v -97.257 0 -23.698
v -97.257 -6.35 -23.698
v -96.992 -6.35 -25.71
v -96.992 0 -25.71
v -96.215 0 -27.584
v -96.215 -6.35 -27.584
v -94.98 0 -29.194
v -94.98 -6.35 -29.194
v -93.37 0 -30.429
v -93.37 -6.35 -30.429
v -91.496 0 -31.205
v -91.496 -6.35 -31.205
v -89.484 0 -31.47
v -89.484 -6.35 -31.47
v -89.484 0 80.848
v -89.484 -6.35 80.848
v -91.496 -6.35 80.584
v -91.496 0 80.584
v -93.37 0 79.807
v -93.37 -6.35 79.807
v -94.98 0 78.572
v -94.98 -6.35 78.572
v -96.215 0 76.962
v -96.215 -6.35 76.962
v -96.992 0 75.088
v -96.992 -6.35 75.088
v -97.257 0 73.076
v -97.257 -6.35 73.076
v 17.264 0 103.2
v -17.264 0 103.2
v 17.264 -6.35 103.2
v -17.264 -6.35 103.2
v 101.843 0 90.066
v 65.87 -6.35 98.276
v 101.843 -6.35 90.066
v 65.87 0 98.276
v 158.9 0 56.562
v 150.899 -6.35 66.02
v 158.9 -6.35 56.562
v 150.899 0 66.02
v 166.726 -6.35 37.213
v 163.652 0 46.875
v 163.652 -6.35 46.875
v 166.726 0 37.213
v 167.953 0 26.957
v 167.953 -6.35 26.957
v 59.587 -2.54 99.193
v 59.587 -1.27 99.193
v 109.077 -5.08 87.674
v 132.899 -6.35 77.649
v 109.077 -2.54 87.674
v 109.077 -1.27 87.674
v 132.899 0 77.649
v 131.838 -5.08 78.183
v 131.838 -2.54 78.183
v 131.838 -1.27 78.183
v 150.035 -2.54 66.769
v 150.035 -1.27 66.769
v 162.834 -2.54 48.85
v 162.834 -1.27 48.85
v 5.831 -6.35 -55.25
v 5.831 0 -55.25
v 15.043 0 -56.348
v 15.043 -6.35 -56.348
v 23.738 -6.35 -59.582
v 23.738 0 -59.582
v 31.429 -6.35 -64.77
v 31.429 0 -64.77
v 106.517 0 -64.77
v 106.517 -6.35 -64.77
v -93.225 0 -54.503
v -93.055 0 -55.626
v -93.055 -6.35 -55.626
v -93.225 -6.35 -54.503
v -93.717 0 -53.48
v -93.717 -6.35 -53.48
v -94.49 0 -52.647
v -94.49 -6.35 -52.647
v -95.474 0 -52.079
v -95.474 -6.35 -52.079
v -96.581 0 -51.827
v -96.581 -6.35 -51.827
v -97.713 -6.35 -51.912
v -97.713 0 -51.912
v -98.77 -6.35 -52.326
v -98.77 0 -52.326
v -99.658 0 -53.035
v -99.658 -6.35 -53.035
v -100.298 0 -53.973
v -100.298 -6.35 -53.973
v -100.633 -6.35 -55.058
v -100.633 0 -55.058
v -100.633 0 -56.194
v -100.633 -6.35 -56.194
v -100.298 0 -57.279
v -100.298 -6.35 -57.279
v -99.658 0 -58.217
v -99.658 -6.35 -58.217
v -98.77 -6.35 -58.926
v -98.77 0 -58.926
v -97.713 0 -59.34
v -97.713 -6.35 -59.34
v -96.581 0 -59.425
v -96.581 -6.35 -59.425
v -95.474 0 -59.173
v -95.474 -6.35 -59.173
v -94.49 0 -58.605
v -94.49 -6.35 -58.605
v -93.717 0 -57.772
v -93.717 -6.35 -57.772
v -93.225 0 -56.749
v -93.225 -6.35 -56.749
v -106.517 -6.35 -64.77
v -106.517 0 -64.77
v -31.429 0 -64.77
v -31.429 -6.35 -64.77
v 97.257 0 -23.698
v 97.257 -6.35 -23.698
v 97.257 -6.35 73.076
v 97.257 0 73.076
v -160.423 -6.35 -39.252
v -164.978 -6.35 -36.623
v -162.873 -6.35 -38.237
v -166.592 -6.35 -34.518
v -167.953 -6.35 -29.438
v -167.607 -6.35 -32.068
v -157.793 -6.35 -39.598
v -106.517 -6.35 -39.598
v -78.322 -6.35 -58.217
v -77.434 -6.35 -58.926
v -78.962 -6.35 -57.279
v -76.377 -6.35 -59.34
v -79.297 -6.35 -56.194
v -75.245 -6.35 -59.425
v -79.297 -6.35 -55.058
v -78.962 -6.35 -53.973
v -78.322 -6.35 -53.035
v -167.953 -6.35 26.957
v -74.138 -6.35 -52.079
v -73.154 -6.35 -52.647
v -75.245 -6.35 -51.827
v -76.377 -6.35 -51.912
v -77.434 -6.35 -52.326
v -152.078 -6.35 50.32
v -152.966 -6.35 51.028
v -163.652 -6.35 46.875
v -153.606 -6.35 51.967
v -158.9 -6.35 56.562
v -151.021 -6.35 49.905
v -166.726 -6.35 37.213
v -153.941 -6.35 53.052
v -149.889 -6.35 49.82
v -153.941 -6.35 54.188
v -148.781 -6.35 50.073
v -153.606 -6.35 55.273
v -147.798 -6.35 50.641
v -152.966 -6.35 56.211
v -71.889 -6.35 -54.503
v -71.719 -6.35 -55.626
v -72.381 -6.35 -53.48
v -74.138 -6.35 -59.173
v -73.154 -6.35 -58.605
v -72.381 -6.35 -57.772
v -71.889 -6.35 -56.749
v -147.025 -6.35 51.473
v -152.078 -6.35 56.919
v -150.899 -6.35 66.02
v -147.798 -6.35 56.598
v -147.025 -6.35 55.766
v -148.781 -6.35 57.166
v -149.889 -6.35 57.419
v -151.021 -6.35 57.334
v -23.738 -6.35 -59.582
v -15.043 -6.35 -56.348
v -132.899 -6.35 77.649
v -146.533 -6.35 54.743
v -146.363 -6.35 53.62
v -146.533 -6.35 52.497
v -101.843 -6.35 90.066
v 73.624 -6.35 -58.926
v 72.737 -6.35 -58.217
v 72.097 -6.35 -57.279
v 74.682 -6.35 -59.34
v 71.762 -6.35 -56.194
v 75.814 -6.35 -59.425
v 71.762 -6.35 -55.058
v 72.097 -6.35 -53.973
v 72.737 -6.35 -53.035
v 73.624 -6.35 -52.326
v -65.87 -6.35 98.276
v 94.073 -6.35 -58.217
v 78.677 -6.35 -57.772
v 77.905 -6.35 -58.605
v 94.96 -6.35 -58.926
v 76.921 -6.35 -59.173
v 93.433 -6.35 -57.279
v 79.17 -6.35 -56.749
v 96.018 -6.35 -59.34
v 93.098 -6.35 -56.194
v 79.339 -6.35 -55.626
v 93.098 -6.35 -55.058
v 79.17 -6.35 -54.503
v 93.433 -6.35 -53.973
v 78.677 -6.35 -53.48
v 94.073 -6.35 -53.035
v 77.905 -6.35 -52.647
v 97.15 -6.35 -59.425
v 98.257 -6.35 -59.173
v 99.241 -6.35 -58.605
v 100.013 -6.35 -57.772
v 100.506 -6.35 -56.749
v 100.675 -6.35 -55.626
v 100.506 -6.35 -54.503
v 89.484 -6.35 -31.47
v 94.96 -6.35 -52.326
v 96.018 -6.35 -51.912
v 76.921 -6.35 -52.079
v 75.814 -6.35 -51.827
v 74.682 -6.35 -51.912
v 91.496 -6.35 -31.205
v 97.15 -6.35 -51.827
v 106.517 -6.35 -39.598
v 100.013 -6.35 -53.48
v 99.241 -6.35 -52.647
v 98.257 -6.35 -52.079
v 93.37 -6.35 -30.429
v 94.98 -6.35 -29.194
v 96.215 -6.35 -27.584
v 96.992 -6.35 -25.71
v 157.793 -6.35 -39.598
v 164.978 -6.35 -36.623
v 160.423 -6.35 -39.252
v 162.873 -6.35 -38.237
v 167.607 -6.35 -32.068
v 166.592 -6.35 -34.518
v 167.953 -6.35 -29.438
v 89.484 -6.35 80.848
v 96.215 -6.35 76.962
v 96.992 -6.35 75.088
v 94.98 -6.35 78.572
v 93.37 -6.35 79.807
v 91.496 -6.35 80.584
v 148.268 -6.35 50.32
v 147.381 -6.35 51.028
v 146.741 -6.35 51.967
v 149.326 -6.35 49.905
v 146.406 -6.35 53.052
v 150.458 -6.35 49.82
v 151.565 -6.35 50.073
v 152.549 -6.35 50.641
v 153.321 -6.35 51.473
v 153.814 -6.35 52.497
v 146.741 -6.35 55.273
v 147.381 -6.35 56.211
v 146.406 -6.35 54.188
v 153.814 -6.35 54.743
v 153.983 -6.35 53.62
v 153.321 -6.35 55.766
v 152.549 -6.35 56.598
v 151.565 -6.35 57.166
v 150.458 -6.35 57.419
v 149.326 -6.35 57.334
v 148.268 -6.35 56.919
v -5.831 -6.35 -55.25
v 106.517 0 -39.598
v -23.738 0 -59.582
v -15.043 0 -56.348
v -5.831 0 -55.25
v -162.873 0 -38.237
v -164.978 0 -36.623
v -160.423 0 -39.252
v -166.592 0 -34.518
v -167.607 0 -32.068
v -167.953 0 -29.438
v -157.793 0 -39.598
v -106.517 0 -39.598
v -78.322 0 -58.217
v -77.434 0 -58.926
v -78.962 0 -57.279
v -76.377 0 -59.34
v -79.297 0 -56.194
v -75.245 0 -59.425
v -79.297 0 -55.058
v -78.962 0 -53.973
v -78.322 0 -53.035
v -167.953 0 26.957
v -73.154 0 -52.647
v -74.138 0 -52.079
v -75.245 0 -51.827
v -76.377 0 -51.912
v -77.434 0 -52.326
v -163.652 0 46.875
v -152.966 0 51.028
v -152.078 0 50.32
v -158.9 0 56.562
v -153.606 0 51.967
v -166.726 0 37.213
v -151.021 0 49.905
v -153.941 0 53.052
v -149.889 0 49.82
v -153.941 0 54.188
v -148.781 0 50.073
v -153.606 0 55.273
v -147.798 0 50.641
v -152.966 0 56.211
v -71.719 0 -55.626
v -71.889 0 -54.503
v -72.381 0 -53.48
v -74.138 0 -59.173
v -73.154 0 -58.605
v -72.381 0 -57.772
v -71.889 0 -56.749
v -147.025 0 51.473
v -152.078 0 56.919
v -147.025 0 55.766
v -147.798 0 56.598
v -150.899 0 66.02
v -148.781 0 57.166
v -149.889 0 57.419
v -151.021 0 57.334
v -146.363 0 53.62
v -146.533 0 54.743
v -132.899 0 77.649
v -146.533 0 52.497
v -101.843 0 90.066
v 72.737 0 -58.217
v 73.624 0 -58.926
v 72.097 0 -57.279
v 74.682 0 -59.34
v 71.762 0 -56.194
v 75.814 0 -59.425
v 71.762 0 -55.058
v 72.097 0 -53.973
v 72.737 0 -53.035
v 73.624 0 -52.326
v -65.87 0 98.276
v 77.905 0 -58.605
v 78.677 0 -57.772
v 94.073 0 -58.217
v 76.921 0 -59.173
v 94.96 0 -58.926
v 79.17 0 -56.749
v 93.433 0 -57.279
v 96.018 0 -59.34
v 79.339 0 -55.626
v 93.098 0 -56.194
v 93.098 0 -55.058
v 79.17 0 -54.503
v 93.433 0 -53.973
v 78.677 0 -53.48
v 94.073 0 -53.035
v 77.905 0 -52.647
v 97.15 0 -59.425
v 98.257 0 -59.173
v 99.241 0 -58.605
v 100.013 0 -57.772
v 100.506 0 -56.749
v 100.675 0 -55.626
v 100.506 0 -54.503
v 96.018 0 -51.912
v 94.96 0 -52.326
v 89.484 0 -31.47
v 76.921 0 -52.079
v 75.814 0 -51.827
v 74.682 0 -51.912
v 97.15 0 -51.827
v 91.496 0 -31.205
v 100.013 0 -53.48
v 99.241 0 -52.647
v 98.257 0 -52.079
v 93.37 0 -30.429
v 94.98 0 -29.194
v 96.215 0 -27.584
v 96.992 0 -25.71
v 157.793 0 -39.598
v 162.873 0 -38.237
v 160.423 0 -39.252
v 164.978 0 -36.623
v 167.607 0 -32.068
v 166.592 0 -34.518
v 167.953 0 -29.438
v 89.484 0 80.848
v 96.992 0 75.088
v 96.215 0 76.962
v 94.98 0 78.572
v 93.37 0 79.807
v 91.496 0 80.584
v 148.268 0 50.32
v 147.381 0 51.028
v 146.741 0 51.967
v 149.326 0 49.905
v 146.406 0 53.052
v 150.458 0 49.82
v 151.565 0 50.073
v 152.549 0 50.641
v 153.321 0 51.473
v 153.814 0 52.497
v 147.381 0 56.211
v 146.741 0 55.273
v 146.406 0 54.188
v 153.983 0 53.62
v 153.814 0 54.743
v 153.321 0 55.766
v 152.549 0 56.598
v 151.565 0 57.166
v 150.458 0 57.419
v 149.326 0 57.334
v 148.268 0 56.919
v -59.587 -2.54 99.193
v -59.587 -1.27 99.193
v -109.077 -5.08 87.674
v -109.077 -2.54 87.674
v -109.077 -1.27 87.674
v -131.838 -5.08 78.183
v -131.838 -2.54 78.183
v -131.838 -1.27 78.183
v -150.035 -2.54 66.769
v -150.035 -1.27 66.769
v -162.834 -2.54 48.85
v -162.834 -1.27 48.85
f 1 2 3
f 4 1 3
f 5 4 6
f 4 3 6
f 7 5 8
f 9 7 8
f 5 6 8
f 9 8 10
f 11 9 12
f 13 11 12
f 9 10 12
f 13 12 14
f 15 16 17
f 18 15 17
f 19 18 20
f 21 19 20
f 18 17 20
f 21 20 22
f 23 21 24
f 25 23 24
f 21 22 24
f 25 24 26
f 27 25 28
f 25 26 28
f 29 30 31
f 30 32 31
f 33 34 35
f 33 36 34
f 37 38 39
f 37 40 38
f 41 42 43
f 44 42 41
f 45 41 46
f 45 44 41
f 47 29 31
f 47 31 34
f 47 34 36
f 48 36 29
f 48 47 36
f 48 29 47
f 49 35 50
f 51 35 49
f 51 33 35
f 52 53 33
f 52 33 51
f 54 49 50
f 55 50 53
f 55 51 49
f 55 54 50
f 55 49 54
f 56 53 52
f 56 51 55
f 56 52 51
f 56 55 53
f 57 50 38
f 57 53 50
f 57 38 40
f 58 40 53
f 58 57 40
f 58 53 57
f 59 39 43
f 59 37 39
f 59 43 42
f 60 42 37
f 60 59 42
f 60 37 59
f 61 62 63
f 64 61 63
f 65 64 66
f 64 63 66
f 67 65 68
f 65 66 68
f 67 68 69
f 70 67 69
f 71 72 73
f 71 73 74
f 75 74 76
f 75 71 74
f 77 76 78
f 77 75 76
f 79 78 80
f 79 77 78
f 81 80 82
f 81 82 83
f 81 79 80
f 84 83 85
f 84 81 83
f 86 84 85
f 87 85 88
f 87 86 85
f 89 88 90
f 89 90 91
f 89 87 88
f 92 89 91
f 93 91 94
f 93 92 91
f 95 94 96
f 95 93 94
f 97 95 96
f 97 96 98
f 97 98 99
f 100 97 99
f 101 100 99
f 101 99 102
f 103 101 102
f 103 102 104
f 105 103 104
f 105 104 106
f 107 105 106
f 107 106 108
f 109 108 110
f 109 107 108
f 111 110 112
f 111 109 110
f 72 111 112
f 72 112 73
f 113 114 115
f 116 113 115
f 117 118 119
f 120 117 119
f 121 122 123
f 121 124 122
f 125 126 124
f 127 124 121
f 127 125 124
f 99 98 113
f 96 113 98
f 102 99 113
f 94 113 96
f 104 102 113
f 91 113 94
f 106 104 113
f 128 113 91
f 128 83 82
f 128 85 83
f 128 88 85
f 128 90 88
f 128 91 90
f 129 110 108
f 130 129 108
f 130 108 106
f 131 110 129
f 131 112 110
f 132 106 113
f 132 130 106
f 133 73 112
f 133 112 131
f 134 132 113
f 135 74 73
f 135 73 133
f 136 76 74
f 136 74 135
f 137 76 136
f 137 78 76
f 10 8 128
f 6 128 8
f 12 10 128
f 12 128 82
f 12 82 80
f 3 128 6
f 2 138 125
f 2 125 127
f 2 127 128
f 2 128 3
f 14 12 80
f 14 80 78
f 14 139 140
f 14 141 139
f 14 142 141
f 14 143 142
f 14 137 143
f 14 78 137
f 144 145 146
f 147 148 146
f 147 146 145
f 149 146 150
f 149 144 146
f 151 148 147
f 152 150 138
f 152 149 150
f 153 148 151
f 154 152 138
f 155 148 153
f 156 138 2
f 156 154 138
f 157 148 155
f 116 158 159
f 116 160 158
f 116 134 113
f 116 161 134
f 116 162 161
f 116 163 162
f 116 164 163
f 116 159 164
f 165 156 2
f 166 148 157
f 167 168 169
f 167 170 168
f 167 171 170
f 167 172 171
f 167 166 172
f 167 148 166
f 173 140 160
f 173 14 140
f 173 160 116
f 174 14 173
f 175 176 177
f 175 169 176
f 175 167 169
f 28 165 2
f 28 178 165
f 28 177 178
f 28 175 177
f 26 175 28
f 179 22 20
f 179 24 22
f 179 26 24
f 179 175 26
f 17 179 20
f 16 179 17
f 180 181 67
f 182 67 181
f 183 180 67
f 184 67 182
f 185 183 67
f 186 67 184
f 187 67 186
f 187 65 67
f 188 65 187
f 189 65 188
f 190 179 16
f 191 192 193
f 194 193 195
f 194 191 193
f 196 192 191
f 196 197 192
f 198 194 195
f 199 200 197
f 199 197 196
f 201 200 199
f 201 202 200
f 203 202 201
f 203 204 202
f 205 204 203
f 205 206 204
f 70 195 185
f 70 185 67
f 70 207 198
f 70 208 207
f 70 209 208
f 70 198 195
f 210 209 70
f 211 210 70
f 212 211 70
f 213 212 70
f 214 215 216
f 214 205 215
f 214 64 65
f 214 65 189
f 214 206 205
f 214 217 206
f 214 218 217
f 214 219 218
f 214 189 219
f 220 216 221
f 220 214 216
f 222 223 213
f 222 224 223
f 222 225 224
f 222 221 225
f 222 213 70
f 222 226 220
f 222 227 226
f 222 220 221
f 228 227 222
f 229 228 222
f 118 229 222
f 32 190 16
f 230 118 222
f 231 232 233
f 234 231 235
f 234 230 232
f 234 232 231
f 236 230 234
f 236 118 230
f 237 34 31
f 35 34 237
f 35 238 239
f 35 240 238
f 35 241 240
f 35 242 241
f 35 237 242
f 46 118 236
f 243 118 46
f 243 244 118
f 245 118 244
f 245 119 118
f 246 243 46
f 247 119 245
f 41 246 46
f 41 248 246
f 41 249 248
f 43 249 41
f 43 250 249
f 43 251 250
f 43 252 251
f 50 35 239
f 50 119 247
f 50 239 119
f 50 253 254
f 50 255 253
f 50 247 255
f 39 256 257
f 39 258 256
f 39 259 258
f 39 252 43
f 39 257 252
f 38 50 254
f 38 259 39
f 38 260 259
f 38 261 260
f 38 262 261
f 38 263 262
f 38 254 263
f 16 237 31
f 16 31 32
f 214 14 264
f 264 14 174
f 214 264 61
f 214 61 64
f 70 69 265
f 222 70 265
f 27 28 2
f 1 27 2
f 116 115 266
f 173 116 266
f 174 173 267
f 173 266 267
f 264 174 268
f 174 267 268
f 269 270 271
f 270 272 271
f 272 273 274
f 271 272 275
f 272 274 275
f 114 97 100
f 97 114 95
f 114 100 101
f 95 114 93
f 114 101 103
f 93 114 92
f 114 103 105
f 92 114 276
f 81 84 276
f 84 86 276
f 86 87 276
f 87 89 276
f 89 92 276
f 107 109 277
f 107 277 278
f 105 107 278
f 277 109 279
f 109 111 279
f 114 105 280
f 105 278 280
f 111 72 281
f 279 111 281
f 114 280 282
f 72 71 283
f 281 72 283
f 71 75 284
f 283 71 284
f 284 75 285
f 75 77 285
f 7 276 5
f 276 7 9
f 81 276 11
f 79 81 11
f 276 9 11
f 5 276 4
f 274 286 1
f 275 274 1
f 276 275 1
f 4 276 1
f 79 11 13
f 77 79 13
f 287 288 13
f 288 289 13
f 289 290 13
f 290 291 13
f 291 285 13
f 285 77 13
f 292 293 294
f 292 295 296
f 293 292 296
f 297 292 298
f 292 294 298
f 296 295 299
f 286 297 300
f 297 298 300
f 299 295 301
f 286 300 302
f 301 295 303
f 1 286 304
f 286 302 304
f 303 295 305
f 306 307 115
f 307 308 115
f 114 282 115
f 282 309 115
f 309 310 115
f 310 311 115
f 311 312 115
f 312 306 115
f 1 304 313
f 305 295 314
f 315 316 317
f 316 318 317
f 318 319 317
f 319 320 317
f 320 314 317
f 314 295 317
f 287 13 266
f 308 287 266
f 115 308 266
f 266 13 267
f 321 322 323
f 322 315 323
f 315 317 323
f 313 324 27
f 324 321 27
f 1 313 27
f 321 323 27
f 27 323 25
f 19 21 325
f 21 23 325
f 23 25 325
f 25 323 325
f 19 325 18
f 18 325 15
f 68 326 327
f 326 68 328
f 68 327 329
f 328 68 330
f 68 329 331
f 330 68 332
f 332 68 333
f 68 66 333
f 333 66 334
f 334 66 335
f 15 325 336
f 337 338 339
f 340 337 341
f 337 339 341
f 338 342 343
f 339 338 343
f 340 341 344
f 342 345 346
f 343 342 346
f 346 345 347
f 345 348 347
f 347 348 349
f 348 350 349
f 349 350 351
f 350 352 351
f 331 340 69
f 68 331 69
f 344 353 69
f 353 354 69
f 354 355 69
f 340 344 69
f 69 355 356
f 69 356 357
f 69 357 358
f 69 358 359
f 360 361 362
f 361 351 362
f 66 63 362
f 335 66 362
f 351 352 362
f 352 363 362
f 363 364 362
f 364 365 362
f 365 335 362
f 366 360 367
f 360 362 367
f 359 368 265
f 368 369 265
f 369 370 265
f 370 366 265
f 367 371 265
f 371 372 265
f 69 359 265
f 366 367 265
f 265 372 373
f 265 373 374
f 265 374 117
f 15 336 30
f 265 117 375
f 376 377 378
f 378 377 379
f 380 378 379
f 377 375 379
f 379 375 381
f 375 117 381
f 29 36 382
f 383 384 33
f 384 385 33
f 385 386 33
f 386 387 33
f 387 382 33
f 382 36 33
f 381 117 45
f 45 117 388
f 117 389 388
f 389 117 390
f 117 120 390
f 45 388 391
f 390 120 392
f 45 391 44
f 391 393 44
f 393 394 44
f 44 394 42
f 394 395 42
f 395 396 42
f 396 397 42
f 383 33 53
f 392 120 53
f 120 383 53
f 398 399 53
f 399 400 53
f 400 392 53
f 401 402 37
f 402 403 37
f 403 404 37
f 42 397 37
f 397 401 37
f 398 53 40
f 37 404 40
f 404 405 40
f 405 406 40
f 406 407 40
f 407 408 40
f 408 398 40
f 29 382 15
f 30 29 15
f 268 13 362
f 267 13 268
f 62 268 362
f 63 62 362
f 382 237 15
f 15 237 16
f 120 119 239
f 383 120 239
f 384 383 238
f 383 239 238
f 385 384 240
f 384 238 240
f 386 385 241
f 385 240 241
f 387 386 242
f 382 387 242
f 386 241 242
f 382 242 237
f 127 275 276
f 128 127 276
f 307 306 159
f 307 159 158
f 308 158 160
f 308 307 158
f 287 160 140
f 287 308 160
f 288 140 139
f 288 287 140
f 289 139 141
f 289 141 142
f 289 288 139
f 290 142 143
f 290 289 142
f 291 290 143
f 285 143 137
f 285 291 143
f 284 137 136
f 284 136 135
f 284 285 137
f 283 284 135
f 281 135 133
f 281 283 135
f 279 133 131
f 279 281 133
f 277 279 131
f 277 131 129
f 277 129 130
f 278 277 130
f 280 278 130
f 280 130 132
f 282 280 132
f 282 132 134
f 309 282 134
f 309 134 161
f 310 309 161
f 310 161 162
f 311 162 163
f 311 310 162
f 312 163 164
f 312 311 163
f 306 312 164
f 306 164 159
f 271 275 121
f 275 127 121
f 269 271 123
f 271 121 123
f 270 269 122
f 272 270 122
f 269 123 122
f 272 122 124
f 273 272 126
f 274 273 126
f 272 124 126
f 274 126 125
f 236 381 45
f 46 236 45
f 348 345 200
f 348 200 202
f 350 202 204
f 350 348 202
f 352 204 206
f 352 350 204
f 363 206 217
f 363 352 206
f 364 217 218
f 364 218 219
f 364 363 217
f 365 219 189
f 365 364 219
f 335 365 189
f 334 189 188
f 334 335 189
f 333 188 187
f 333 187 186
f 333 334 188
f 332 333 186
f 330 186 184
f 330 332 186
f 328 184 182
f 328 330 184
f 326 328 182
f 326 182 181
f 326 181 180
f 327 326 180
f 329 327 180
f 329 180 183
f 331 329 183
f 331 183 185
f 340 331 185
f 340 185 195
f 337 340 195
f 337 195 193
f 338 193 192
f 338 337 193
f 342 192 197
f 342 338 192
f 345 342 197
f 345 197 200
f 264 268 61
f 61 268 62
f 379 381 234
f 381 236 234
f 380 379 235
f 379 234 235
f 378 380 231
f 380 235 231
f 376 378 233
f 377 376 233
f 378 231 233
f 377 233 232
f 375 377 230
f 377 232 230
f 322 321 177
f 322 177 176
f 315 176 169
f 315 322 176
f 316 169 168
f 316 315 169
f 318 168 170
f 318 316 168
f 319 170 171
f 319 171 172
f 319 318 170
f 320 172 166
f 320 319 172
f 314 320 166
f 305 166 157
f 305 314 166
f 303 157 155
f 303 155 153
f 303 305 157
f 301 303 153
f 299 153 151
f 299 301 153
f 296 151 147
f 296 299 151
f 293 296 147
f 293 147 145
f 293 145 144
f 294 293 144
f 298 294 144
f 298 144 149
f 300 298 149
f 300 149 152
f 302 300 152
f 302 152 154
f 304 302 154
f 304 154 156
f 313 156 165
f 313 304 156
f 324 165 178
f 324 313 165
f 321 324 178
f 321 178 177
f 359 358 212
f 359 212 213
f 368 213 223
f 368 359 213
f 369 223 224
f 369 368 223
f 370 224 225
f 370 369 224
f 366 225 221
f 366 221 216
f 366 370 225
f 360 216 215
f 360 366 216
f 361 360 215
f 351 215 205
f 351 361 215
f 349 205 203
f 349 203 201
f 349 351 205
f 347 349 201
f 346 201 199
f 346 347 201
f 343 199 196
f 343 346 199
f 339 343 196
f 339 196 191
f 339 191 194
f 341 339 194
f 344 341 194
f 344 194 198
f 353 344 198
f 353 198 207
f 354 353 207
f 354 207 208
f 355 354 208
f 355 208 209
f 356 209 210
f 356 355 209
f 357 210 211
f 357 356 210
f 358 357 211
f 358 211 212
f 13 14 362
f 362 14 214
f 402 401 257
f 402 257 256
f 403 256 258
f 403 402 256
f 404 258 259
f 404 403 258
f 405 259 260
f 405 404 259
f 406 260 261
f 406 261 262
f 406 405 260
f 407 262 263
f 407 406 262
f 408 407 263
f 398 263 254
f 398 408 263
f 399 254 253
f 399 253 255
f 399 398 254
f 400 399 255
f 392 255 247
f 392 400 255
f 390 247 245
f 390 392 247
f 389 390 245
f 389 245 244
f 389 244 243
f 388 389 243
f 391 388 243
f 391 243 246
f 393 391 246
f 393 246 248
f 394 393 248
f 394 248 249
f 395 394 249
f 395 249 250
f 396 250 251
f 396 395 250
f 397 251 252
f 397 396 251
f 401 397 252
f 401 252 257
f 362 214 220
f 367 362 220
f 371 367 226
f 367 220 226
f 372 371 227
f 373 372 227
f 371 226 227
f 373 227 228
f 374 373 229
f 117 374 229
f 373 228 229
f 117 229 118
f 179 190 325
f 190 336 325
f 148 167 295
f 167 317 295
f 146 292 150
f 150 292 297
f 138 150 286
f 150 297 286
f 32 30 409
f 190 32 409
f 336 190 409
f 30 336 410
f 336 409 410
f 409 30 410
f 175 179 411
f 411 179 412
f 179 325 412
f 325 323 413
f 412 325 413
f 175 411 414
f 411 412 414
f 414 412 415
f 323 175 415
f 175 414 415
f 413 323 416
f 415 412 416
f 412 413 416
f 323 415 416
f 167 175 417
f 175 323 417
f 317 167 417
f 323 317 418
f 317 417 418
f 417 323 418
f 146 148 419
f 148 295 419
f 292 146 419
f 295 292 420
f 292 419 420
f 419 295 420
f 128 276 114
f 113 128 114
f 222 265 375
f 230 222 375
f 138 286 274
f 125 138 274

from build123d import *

# Parameters (mm, degrees)
F0_R     = 3.81
F1_DEPTH = 6.35
F2_R     = 10.16
F4_DEPTH = 25.4
F5_R     = 254


with BuildPart() as f1:
    # F0 (on Front) → F1 (new body)
    with BuildSketch(Plane.XZ):
        with BuildLine():
            Line((-106.5174639225, -64.77), (-31.4290560782, -64.77))
            ThreePointArc((-31.4290560782, -64.77), (-19.4864111897, -57.7068407051), (-5.8307349682, -55.249709636))
            Line((-5.8307349682, -55.249709636), (0, -55.249709636))
            Line((0, -55.249709636), (5.8307349682, -55.249709636))
            ThreePointArc((5.8307349682, -55.249709636), (19.4864111897, -57.7068407051), (31.4290560782, -64.77))
            Line((31.4290560782, -64.77), (106.5174639225, -64.77))
            Line((106.5174639225, -64.77), (106.5174639225, -39.5983140361))
            Line((106.5174639225, -39.5983140361), (167.9534316063, -39.5983140361))
            Line((167.9534316063, -39.5983140361), (167.9534316063, 26.9573238301))
            add(Edge.make_bspline(
                [(0, 104.3131649494), (20.410301584, 103.0330934585), (59.6583638346, 100.5752160198), (107.8367322286, 90.1029474639), (151.6277590611, 69.5902698618), (163.4617376042, 49.6125522636), (167.9534316063, 34.663336698), (167.9534316063, 26.9573238301)],
                knots=[0, 0, 0, 0, 0.2488471703, 0.4782216393, 0.6964249219, 0.8474229551, 1, 1, 1, 1], degree=3))
            add(Edge.make_bspline(
                [(0, 104.3131649494), (-20.410301584, 103.0330934585), (-59.6583638346, 100.5752160198), (-107.8367322286, 90.1029474639), (-151.6277590611, 69.5902698618), (-163.4617376042, 49.6125522636), (-167.9534316063, 34.663336698), (-167.9534316063, 26.9573238301)],
                knots=[0, 0, 0, 0, 0.2488471703, 0.4782216393, 0.6964249219, 0.8474229551, 1, 1, 1, 1], degree=3))
            Line((-167.9534316063, 26.9573238301), (-167.9534316063, -39.5983140361))
            Line((-167.9534316063, -39.5983140361), (-106.5174639225, -39.5983140361))
            Line((-106.5174639225, -39.5983140361), (-106.5174639225, -64.77))
        make_face()
        with Locations((-96.8654639225, -55.626)):
            Circle(F0_R, mode=Mode.SUBTRACT)
        with Locations((-75.5294639225, -55.626)):
            Circle(F0_R, mode=Mode.SUBTRACT)
        with Locations((75.5294639225, -55.626)):
            Circle(F0_R, mode=Mode.SUBTRACT)
        with Locations((96.8654639225, -55.626)):
            Circle(F0_R, mode=Mode.SUBTRACT)
        with Locations((-150.1734316063, 53.6196859639)):
            Circle(F0_R, mode=Mode.SUBTRACT)
        with Locations((150.1734316063, 53.6196859639)):
            Circle(F0_R, mode=Mode.SUBTRACT)
    extrude(amount=F1_DEPTH)

    # F2
    f2_edges = [f1.edges().sort_by_distance(p)[0] for p in [
        (167.953432, -3.175, -39.598314),
        (-167.953432, -3.175, -39.598314),
    ]]
    fillet(f2_edges, radius=F2_R)

    # F3 (on face) → F4 (cut)
    with BuildSketch(Plane.XZ.offset(6.35)):
        with BuildLine():
            ThreePointArc((-97.2566, -23.6979140361), (-94.9801167461, -29.1938307822), (-89.4842, -31.4703140361))
            Line((-89.4842, -31.4703140361), (89.4842, -31.4703140361))
            ThreePointArc((89.4842, -31.4703140361), (94.9801167461, -29.1938307822), (97.2566, -23.6979140361))
            Line((97.2566, -23.6979140361), (97.2566, 73.0760859639))
            ThreePointArc((97.2566, 73.0760859639), (94.9801167461, 78.57200271), (89.4842, 80.8484859639))
            Line((89.4842, 80.8484859639), (-89.4842, 80.8484859639))
            ThreePointArc((-89.4842, 80.8484859639), (-94.9801167461, 78.57200271), (-97.2566, 73.0760859639))
            Line((-97.2566, 73.0760859639), (-97.2566, -23.6979140361))
        make_face()
    extrude(amount=-F4_DEPTH, mode=Mode.SUBTRACT)

    # F5
    f5_edges = [f1.edges().sort_by_distance(p)[0] for p in [
        (0, -3.175, 104.313165),
    ]]
    fillet(f5_edges, radius=F5_R)


solid = f1.part
